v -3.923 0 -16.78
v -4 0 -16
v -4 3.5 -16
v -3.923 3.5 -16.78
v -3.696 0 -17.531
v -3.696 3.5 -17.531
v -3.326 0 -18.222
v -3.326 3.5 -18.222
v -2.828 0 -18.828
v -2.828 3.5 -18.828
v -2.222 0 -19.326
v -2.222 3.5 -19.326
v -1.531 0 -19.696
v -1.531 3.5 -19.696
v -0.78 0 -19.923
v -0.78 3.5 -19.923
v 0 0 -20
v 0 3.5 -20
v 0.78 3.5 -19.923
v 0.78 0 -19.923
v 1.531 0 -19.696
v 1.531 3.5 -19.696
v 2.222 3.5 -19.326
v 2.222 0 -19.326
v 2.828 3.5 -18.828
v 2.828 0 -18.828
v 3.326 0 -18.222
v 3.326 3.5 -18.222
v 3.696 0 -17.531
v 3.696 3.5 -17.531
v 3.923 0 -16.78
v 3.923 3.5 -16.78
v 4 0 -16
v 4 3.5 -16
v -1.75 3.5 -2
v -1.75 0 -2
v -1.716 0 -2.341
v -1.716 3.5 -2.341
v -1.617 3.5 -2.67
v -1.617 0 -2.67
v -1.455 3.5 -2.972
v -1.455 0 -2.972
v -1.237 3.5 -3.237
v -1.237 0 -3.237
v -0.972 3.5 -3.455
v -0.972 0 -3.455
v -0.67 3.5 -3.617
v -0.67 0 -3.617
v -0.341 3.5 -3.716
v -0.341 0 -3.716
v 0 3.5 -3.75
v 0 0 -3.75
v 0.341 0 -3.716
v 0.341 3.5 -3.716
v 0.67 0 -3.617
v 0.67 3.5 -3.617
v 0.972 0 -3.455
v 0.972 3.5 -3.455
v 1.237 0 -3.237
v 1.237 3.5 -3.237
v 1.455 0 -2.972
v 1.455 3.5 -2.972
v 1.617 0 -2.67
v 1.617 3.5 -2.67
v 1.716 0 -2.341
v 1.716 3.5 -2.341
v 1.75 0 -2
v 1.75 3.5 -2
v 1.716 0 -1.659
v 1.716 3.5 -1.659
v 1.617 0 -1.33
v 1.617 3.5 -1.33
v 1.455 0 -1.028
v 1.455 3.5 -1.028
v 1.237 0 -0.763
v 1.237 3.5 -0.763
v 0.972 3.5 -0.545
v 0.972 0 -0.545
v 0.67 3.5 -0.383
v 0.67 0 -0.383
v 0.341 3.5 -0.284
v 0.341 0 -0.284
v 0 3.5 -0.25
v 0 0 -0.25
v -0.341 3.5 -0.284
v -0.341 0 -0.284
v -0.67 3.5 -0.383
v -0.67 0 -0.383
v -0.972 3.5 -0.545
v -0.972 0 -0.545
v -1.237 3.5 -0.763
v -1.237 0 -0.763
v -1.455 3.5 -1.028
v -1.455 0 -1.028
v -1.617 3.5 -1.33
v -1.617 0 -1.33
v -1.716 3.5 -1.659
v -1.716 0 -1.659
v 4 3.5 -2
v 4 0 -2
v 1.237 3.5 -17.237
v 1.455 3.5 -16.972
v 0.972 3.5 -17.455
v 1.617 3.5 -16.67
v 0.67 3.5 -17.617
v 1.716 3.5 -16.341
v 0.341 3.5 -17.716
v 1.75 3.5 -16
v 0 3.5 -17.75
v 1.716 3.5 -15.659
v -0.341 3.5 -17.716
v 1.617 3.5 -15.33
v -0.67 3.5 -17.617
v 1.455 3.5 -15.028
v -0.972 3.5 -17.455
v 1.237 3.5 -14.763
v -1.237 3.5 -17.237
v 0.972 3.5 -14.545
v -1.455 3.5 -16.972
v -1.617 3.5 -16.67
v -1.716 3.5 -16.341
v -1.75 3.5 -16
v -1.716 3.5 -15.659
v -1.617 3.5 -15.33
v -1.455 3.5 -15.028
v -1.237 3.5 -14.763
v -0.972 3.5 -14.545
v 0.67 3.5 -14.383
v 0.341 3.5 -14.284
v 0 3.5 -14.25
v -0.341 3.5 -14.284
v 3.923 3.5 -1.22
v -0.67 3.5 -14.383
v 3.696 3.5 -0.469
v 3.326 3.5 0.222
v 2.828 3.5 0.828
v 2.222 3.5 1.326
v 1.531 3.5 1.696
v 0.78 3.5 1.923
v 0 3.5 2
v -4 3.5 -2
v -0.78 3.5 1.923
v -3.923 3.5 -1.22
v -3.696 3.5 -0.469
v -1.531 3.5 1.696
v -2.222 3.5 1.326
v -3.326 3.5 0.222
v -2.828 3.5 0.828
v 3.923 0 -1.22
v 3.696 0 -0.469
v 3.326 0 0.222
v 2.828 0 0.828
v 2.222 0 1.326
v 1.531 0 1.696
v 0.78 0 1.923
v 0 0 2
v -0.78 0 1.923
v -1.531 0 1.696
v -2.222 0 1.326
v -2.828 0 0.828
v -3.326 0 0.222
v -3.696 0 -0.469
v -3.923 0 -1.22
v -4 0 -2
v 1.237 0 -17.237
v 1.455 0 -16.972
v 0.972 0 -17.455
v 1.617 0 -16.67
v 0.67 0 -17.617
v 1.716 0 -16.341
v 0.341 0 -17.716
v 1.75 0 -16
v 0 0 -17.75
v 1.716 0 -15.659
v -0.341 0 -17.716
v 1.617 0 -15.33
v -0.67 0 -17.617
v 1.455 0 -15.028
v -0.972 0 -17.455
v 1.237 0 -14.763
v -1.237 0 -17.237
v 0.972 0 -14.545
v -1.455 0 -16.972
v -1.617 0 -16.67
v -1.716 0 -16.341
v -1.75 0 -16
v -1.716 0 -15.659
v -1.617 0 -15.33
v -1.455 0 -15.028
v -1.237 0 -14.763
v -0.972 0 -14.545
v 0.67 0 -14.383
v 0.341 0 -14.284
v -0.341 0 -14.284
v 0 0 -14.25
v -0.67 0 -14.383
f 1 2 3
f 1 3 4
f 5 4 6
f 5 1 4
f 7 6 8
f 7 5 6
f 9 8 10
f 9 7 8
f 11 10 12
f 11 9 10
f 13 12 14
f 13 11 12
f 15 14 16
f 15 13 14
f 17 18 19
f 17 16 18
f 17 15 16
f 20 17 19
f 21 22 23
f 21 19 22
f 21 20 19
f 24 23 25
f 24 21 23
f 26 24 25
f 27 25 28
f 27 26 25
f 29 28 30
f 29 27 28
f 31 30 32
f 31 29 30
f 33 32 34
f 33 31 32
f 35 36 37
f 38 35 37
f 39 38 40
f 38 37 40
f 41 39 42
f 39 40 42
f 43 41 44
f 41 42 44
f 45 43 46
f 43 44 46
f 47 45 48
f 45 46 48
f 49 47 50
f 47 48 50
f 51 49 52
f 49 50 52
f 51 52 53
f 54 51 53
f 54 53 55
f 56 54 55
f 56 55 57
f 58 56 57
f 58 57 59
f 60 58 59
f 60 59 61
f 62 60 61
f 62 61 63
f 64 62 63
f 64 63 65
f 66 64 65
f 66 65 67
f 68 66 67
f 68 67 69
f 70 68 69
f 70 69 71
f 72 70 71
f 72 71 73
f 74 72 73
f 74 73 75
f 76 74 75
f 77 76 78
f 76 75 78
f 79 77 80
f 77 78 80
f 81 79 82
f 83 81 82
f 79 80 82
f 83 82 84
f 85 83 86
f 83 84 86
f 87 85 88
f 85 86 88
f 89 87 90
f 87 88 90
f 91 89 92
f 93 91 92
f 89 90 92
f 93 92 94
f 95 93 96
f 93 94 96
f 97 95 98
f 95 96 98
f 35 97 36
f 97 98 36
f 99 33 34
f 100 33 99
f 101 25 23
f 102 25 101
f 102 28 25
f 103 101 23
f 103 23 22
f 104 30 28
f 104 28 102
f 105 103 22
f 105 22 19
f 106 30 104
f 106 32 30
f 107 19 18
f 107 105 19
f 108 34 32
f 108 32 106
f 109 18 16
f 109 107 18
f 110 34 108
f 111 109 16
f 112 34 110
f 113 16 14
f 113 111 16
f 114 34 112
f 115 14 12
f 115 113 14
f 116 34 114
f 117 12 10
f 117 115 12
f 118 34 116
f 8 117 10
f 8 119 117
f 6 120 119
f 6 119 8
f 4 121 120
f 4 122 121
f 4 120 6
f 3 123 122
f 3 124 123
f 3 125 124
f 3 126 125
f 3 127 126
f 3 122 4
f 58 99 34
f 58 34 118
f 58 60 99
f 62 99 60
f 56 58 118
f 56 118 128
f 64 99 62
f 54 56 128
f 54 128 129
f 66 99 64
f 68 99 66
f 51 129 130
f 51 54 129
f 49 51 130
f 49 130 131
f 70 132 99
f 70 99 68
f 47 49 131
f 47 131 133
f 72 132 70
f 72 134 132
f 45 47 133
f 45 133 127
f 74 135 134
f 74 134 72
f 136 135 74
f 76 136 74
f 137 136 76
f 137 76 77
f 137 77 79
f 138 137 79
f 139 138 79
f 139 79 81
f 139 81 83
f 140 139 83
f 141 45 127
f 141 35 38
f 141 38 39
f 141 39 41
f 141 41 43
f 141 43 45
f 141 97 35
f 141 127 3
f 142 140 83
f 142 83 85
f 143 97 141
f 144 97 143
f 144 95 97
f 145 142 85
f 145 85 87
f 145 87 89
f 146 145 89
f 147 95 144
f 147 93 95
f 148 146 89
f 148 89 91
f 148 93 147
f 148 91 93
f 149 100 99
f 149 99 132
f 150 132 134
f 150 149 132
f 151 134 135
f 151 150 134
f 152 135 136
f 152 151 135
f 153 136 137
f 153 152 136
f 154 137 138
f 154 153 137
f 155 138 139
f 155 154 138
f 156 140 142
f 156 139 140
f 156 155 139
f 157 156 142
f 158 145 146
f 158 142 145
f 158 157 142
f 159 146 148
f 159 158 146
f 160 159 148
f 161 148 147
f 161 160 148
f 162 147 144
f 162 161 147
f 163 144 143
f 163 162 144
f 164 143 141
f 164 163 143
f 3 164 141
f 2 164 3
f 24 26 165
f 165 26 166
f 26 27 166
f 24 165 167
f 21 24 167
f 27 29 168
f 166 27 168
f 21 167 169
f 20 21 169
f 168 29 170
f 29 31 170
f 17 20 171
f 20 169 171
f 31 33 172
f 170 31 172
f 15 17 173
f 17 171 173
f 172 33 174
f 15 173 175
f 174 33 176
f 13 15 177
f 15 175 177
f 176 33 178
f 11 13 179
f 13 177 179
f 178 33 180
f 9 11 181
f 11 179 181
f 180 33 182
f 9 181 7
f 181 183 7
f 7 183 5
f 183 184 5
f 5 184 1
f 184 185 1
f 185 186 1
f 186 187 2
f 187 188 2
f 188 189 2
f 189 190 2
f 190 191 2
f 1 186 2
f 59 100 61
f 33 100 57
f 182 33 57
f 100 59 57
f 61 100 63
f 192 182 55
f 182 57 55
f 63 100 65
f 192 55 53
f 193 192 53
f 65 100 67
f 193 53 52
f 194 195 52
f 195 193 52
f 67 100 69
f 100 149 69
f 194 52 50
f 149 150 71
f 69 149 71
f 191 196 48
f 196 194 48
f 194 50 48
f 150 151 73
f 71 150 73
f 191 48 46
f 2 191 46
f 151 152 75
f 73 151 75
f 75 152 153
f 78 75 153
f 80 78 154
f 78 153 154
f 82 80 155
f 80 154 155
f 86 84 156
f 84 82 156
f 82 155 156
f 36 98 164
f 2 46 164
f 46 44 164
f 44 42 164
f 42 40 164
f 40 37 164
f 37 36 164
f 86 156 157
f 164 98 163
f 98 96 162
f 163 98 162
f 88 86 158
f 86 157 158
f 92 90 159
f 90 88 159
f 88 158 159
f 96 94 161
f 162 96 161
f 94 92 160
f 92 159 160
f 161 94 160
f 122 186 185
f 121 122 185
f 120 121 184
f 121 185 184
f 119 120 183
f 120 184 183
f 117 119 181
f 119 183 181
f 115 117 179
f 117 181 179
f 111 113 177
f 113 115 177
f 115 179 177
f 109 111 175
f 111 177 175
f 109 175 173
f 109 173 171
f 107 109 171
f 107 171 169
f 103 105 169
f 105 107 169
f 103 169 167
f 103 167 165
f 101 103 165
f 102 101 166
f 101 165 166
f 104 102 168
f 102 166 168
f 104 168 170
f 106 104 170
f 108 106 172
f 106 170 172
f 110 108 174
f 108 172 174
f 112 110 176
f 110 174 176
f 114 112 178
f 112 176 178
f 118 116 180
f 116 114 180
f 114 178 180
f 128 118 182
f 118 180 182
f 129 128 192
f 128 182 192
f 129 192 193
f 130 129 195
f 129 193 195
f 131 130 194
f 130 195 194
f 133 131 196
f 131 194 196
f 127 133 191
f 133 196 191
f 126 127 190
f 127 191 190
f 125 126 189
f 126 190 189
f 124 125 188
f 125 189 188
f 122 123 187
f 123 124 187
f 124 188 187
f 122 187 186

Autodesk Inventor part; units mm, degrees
ref_plane "YZ Plane" through (0, 0, 0) normal (1, 0, 0) x (0, 1, 0)
ref_plane "XZ Plane" through (0, 0, 0) normal (0, 1, 0) x (-1, 0, 0)
ref_plane "XY Plane" through (0, 0, 0) normal (0, 0, 1) x (1, 0, 0)
sketch "Boceto1" plane through (0, 0, 0) normal (0, 1, 0) x (-1, 0, 0)
  arc A0 (-4, -16) -> (4, -16) centre (0, -16) ccw
  arc A1 (4, -2) -> (-4, -2) centre (0, -2) ccw
  line L0 (4, -2) -> (4, -16)
  line L1 (-4, -16) -> (-4, -2)
  line L2 (0, -4) -> (0, -2)
  circle A2 centre (0, -2) radius 1.75
  circle A3 centre (0, -16) radius 1.75
  point P0 (0, 0)
  dimension "d4" = 8
  dimension "d8" = 3.5
  dimension "d9" = 3.5
extrude "Extrusión1" add sketch "Boceto1" along normal blind 3.5 contours L1 A1 L0 A0 | A2 | A3
extrude "Extrusión2" cut sketch "Boceto1" along normal blind 3.5 contours A2 | A3
properties part number "DIREcicon2opala"
